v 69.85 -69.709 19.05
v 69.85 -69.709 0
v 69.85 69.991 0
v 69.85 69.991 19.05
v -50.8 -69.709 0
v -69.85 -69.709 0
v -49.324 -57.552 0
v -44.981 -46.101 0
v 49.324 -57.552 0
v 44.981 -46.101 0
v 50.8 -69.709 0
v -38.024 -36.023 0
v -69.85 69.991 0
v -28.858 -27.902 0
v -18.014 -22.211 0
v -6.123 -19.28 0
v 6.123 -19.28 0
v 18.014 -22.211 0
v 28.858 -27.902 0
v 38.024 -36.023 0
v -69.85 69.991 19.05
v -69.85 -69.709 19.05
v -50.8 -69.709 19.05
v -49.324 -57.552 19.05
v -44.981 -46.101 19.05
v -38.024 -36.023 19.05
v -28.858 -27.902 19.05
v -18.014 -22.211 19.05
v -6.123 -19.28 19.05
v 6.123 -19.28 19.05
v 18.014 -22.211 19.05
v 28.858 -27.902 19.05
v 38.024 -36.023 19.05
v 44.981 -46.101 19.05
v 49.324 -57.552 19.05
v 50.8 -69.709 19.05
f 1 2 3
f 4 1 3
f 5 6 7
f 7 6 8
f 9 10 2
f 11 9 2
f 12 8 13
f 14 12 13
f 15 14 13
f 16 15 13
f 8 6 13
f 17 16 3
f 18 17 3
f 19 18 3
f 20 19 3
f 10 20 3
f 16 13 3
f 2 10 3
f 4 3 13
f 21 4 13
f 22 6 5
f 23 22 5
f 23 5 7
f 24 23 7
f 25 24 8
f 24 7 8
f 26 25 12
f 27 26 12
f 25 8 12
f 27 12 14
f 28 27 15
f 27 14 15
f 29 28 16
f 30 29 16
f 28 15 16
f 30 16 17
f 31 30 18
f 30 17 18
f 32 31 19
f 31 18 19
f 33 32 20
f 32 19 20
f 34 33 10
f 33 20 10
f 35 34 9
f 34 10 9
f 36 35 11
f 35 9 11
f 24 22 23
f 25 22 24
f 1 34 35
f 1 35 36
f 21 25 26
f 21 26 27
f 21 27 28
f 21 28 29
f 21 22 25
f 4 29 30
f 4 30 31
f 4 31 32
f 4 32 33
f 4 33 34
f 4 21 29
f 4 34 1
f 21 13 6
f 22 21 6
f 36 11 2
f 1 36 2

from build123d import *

# Parameters (mm, degrees)
F1_DEPTH = 19.05


with BuildPart() as f1:
    # F0 (on Top) → F1 (new body)
    with BuildSketch(Plane.XY):
        with BuildLine():
            Line((69.849999, -69.709386), (69.849999, 69.990614))
            Line((69.849999, 69.990614), (-69.850001, 69.990614))
            Line((-69.850001, 69.990614), (-69.850001, -69.709386))
            Line((-69.850001, -69.709386), (-50.800001, -69.709386))
            ThreePointArc((-50.800001, -69.709386), (-1e-06, -18.909386), (50.799999, -69.709386))
            Line((50.799999, -69.709386), (69.849999, -69.709386))
        make_face()
    extrude(amount=F1_DEPTH)


solid = f1.part
